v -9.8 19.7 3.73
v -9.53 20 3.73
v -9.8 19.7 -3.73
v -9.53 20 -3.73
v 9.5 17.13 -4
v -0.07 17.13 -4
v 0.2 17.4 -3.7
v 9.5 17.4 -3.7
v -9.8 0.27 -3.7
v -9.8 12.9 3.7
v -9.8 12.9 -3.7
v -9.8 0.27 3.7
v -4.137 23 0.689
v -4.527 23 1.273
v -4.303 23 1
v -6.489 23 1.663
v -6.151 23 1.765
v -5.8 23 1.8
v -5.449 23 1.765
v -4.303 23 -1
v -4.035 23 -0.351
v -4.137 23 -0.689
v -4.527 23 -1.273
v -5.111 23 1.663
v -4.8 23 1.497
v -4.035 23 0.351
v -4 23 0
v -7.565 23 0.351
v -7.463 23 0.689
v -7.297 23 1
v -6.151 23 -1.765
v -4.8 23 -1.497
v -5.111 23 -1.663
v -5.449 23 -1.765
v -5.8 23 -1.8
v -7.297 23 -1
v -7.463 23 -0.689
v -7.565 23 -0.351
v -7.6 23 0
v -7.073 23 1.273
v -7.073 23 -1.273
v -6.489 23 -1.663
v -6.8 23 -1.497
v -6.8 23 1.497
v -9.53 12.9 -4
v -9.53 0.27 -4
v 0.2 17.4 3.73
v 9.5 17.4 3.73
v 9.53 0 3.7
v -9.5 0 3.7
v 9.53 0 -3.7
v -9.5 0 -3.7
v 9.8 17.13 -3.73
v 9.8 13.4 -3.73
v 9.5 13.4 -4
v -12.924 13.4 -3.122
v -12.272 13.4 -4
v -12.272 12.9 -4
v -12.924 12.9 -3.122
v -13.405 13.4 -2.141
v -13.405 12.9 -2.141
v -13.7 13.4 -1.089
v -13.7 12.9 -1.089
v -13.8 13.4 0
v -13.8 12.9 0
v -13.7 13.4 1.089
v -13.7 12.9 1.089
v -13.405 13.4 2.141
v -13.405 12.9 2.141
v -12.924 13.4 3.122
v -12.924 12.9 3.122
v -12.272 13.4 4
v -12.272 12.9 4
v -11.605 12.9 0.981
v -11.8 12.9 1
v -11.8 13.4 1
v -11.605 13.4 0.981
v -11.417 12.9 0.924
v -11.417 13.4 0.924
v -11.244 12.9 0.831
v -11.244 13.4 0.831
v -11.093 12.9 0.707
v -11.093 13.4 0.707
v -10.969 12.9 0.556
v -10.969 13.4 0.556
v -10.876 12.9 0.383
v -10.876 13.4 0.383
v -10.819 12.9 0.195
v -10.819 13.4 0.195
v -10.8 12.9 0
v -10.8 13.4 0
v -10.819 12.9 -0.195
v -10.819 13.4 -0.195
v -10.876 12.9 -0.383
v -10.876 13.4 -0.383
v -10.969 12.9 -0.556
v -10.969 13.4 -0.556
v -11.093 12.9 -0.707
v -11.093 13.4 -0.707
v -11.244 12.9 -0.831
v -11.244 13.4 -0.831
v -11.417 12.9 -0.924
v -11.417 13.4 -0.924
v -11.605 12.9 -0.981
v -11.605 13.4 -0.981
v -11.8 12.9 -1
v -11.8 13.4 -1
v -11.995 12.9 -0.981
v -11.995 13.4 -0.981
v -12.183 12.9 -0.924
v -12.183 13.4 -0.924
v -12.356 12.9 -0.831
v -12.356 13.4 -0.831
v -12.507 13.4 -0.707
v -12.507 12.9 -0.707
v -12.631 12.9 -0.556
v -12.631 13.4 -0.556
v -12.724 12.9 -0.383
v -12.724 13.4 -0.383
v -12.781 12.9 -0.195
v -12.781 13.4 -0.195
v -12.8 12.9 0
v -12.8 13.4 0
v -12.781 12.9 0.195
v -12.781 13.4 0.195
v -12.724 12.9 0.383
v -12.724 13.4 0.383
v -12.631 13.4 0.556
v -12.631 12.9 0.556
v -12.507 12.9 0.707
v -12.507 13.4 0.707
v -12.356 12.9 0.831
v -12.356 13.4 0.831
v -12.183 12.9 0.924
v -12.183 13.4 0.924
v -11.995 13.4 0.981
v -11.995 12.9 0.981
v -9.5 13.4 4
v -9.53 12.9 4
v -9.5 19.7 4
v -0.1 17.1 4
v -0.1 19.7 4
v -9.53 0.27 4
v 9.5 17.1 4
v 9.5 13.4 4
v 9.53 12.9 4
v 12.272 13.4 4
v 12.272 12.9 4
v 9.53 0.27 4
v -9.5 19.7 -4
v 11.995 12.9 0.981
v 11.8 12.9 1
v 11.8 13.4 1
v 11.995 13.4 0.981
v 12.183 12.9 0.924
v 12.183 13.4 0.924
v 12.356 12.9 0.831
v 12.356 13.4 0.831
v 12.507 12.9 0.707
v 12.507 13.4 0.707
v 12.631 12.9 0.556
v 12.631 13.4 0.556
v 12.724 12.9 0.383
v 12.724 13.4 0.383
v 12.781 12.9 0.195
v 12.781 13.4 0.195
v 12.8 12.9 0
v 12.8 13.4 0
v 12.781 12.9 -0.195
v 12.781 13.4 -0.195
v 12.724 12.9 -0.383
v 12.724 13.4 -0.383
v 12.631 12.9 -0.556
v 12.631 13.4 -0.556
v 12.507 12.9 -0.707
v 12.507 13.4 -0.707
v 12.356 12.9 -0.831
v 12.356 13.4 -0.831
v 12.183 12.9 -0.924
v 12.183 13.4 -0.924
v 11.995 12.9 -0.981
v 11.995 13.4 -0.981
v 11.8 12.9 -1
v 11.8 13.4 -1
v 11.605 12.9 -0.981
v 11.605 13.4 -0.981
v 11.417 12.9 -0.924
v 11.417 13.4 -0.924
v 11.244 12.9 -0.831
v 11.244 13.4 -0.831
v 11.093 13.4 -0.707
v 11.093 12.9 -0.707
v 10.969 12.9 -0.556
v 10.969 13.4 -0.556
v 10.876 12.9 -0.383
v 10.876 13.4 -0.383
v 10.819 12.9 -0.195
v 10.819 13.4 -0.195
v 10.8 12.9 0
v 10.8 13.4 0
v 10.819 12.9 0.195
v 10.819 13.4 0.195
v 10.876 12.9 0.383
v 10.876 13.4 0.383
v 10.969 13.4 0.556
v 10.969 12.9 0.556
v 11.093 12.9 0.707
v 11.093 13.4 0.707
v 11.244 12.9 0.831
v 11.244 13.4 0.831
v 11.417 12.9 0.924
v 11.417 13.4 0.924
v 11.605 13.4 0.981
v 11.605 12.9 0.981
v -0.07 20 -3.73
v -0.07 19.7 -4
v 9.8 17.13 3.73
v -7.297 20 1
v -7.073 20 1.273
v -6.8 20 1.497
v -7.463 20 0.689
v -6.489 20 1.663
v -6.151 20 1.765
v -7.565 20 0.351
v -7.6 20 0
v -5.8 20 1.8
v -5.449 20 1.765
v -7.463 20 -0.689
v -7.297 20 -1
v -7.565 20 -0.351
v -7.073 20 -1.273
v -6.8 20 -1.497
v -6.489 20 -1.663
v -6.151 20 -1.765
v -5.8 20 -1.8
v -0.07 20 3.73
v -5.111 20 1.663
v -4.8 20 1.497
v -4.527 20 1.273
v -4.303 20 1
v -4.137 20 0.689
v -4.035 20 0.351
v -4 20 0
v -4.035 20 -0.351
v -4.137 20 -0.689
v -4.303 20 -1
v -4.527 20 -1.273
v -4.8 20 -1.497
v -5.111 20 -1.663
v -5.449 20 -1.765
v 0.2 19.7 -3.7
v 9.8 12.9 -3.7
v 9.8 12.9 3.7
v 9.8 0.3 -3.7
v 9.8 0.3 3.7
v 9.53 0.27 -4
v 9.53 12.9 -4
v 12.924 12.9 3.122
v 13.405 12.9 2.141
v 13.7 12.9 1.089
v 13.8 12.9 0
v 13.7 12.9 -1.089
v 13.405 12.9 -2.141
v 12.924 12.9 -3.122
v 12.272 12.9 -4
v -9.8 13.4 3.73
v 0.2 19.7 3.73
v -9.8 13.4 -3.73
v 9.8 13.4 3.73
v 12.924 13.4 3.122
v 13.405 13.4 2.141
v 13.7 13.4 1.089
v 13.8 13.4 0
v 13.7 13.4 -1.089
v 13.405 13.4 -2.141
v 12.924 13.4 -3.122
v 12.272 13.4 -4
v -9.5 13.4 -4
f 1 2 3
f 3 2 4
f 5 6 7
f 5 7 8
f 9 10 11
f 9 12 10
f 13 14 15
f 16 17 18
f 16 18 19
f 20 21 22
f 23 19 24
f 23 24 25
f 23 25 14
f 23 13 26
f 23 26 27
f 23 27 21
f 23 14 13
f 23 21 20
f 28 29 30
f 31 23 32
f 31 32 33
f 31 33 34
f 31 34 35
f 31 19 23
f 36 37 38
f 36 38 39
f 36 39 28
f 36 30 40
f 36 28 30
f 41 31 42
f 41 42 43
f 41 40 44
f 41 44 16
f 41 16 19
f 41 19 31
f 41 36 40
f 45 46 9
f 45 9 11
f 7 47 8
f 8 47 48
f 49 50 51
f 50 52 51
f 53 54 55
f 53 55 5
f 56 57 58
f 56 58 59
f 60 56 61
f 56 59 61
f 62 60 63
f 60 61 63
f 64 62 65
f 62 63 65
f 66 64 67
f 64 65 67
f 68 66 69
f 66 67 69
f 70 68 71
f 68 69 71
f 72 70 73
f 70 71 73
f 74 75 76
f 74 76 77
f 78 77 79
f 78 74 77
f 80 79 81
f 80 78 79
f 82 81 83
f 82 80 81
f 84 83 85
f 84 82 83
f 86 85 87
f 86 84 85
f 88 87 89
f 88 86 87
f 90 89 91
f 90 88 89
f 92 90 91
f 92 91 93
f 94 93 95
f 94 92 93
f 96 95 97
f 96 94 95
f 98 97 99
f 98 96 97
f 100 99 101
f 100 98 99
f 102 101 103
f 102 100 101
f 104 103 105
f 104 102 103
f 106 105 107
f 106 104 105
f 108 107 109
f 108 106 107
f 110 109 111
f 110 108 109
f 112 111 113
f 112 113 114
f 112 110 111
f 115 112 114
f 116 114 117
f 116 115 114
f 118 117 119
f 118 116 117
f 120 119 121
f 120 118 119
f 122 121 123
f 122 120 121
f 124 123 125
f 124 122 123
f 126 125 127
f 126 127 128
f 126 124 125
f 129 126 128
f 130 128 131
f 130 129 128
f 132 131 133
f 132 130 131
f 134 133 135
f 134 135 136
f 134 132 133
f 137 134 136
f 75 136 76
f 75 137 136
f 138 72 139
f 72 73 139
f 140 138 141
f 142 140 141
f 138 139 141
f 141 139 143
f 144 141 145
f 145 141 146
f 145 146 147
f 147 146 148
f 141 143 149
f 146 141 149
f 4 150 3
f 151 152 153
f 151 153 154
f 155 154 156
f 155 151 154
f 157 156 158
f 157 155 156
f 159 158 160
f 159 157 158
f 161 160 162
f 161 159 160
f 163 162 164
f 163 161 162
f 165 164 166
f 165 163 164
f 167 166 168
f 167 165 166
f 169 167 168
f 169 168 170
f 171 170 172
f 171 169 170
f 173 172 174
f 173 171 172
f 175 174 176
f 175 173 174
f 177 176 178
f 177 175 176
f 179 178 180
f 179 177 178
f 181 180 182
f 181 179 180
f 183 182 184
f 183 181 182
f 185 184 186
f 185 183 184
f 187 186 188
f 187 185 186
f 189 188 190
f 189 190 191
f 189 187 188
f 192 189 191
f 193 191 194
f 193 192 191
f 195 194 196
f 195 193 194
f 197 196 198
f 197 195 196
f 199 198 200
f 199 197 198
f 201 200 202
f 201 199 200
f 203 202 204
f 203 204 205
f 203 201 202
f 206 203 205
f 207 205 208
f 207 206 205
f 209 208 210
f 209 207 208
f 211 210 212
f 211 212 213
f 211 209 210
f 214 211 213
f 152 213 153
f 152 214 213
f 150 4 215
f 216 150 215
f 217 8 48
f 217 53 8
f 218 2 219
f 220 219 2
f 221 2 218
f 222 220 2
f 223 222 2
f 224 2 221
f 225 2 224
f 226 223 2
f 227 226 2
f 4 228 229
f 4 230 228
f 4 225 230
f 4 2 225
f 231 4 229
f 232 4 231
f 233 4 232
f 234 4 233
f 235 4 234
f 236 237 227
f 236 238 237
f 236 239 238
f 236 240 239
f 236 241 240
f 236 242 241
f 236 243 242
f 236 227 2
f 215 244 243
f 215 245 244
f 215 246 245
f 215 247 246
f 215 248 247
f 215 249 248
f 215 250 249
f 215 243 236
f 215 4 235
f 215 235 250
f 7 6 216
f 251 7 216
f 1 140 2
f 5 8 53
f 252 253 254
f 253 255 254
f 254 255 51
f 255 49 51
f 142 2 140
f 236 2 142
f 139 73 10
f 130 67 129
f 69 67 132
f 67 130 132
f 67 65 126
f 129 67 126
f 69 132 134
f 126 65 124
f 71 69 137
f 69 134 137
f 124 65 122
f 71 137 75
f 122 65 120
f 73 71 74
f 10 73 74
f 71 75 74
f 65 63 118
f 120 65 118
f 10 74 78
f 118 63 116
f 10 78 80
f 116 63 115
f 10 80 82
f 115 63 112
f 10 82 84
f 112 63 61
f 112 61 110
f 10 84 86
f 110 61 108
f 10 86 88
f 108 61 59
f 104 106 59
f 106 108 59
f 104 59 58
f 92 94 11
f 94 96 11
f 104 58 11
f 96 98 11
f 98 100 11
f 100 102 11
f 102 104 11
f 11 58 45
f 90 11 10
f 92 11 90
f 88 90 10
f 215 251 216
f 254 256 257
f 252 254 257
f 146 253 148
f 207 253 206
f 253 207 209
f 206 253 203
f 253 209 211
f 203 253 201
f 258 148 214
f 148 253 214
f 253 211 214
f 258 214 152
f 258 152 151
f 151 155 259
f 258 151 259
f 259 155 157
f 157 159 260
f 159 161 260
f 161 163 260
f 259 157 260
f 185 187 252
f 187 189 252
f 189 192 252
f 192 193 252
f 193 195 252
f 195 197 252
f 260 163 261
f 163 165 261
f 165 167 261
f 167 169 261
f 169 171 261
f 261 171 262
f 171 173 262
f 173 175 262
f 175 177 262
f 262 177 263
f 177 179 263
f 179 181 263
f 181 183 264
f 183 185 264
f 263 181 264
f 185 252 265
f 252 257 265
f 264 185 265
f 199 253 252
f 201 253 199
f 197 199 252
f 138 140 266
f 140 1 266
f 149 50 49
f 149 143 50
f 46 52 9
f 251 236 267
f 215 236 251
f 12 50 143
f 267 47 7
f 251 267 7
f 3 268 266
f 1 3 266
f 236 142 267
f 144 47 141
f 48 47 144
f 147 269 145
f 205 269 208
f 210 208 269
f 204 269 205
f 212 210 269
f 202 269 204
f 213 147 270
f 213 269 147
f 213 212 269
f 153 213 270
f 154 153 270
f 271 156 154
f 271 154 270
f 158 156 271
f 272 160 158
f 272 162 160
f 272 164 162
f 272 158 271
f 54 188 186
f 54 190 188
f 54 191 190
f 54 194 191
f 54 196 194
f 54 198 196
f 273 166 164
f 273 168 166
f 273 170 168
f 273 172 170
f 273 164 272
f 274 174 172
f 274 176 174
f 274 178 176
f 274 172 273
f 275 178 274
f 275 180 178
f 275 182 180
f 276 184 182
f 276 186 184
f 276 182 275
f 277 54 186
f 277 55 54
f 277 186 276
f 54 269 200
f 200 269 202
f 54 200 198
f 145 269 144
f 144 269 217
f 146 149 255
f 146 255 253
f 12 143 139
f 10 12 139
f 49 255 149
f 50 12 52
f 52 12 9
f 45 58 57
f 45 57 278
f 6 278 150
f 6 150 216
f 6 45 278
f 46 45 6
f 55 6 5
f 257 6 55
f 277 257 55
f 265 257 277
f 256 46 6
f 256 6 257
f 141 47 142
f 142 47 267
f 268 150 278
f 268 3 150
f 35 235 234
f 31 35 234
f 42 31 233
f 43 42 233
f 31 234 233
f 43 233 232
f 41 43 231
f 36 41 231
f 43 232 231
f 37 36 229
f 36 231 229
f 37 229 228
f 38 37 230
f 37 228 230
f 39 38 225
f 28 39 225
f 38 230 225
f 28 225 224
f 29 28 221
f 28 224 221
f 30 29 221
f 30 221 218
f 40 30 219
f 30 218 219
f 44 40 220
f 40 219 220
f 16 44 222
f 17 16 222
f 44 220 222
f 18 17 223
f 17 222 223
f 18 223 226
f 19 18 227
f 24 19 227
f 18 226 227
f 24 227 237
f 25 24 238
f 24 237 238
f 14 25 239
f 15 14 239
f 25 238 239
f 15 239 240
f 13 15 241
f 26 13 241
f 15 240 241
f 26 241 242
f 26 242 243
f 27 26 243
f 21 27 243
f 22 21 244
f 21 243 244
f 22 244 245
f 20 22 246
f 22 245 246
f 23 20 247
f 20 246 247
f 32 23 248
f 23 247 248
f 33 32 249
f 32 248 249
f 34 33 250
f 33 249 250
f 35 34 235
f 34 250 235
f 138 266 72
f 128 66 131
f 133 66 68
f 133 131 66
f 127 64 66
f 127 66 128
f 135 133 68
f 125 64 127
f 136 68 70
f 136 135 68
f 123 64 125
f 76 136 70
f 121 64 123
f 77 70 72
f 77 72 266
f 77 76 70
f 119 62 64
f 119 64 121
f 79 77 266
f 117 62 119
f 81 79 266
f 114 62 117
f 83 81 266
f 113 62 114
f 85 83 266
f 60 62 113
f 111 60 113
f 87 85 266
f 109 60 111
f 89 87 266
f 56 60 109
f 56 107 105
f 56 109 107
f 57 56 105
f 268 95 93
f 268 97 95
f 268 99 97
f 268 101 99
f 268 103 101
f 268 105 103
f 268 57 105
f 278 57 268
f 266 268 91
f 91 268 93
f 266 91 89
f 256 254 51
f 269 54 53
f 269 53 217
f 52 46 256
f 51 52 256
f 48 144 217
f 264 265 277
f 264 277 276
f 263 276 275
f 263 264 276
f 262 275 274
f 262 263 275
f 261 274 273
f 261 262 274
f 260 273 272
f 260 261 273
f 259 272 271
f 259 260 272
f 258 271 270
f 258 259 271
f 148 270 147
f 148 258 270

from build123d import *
from OCP.BRepFilletAPI import BRepFilletAPI_MakeChamfer

# Parameters (mm, degrees)
SKETCH_1_W          = 19.6
SKETCH_1_H          = 8
EXTRUDE_1_DEPTH     = 12.9
SKETCH_2_W          = 27.6
SKETCH_2_H          = 8
SKETCH_2_R          = 1
EXTRUDE_2_DEPTH     = 0.5
SKETCH_3_W          = 19.6
SKETCH_3_H          = 8
EXTRUDE_3_DEPTH     = 17.4
SKETCH_4_W          = 10
SKETCH_4_H          = 8
EXTRUDE_5_DEPTH     = 20
SKETCH_6_R          = 1.8
EXTRUDE_6_DEPTH     = 3
CUT_EXTRUDE_2_DEPTH = 17
CHAMFER_1_SIZE      = 0.3
CHAMFER_1_SIZE2     = 0.270121213


with BuildPart() as part:
    # 草图1 → 凸台-拉伸1 (new body)
    with BuildSketch(Plane(origin=(0, 0, 0), x_dir=(1, 0, 0), z_dir=(0, 1, 0))):
        Rectangle(SKETCH_1_W, SKETCH_1_H)
    extrude(amount=EXTRUDE_1_DEPTH)

    # 草图2 → 凸台-拉伸2 (add)
    with BuildSketch(Plane(origin=(0, 12.9, 0), x_dir=(1, 0, 0), z_dir=(0, 1, 0))):
        Rectangle(SKETCH_2_W, SKETCH_2_H)
        with Locations(Location((-11.8, 0, 0), (0, 0, 270))):
            Circle(SKETCH_2_R, mode=Mode.SUBTRACT)
        with Locations(Location((11.8, 0, 0), (0, 0, 270))):
            Circle(SKETCH_2_R, mode=Mode.SUBTRACT)
    extrude(amount=EXTRUDE_2_DEPTH)

    # 草图3 → 凸台-拉伸3 (add)
    with BuildSketch(Plane.XZ):
        Rectangle(SKETCH_3_W, SKETCH_3_H)
    extrude(amount=-EXTRUDE_3_DEPTH)

    # 草图4 → 凸台-拉伸5 (add)
    with BuildSketch(Plane(origin=(0, 0, 0), x_dir=(1, 0, 0), z_dir=(0, 1, 0))):
        with Locations((-4.8, 0)):
            Rectangle(SKETCH_4_W, SKETCH_4_H)
    extrude(amount=EXTRUDE_5_DEPTH)

    # 草图6 → 凸台-拉伸6 (add)
    with BuildSketch(Plane(origin=(0, 20, 0), x_dir=(1, 0, 0), z_dir=(0, 1, 0))):
        with Locations(Location((-5.8, 0, 0), (0, 0, 90))):
            Circle(SKETCH_6_R)
    extrude(amount=EXTRUDE_6_DEPTH)

    # 草图7 → 切除-拉伸2 (cut)
    with BuildSketch(Plane.XZ):
        with BuildLine():
            Line((14.367004184, -5.785535706), (9.389835398, -5.785535706))
            ThreePointArc((9.389835398, -5.785535706), (13.783545245, -0.444056645), (10.226439047, 5.487476064))
            Line((10.226439047, 5.487476064), (14.54010062, 5.487476064))
            Line((14.54010062, 5.487476064), (14.367004184, -5.785535706))
        make_face()
        with BuildLine():
            Line((-10.226439047, 5.487476064), (-14.54010062, 5.487476064))
            Line((-14.54010062, 5.487476064), (-14.367004184, -5.785535706))
            Line((-14.367004184, -5.785535706), (-9.389835398, -5.785535706))
            ThreePointArc((-9.389835398, -5.785535706), (-13.783545245, -0.444056645), (-10.226439047, 5.487476064))
        make_face()
    extrude(amount=-CUT_EXTRUDE_2_DEPTH, mode=Mode.SUBTRACT)

    # 倒角1: one chamfer whose edges measure the first distance from different faces: ONE call of the kernel's chamfer builder (chamfer() names one face for all edges)
    chamfer_1_edges_1 = [part.edges().sort_by_distance(p)[0] for p in [
        (9.8, 15.4, -4),
        (-9.8, 16.7, -4),
        (-4.8, 20, -4),
    ]]
    chamfer_1_side_1 = [part.faces().sort_by_distance(p)[0] for p in [
        (-0.337742628, 9.433402177, -4),
    ]]
    chamfer_1_edges_2 = [part.edges().sort_by_distance(p)[0] for p in [
        (-9.8, 16.7, 4),
        (5, 17.4, 4),
        (9.8, 15.4, 4),
        (0.2, 18.7, 4),
        (-4.8, 20, 4),
    ]]
    chamfer_1_side_2 = [part.faces().sort_by_distance(p)[0] for p in [
        (-0.337742628, 9.433402177, 4),
    ]]
    chamfer_1_edges_3 = [part.edges().sort_by_distance(p)[0] for p in [
        (9.8, 17.4, 0),
        (5, 17.4, -4),
    ]]
    chamfer_1_side_3 = [part.faces().sort_by_distance(p)[0] for p in [
        (5, 17.4, 0),
    ]]
    chamfer_1_edges_4 = [part.edges().sort_by_distance(p)[0] for p in [
        (0, 0, 4),
        (-9.8, 0, 0),
        (0, 0, -4),
    ]]
    chamfer_1_side_4 = [part.faces().sort_by_distance(p)[0] for p in [
        (0, 0, 0),
    ]]
    chamfer_1_edges_5 = [part.edges().sort_by_distance(p)[0] for p in [
        (0.2, 18.7, -4),
        (0.2, 20, 0),
    ]]
    chamfer_1_side_5 = [part.faces().sort_by_distance(p)[0] for p in [
        (0.2, 18.7, 0),
    ]]
    chamfer_1_edges_6 = [part.edges().sort_by_distance(p)[0] for p in [
        (9.8, 0, 0),
        (9.8, 6.45, 4),
        (9.8, 6.45, -4),
    ]]
    chamfer_1_side_6 = [part.faces().sort_by_distance(p)[0] for p in [
        (9.8, 6.45, 0),
    ]]
    chamfer_1_edges_7 = [part.edges().sort_by_distance(p)[0] for p in [
        (-9.8, 20, 0),
    ]]
    chamfer_1_side_7 = [part.faces().sort_by_distance(p)[0] for p in [
        (-9.8, 16.7, 0),
    ]]
    chamfer_1_edges_8 = [part.edges().sort_by_distance(p)[0] for p in [
        (-9.8, 6.45, 4),
        (-9.8, 6.45, -4),
    ]]
    chamfer_1_side_8 = [part.faces().sort_by_distance(p)[0] for p in [
        (-9.8, 6.45, 0),
    ]]
    chamfer_1 = BRepFilletAPI_MakeChamfer(part.part.solid().wrapped)
    for e in chamfer_1_edges_1:
        chamfer_1.Add(CHAMFER_1_SIZE, CHAMFER_1_SIZE2, e.wrapped, chamfer_1_side_1[0].wrapped)  # the first distance lies on this face
    for e in chamfer_1_edges_2:
        chamfer_1.Add(CHAMFER_1_SIZE, CHAMFER_1_SIZE2, e.wrapped, chamfer_1_side_2[0].wrapped)  # the first distance lies on this face
    for e in chamfer_1_edges_3:
        chamfer_1.Add(CHAMFER_1_SIZE, CHAMFER_1_SIZE2, e.wrapped, chamfer_1_side_3[0].wrapped)  # the first distance lies on this face
    for e in chamfer_1_edges_4:
        chamfer_1.Add(CHAMFER_1_SIZE, CHAMFER_1_SIZE2, e.wrapped, chamfer_1_side_4[0].wrapped)  # the first distance lies on this face
    for e in chamfer_1_edges_5:
        chamfer_1.Add(CHAMFER_1_SIZE, CHAMFER_1_SIZE2, e.wrapped, chamfer_1_side_5[0].wrapped)  # the first distance lies on this face
    for e in chamfer_1_edges_6:
        chamfer_1.Add(CHAMFER_1_SIZE, CHAMFER_1_SIZE2, e.wrapped, chamfer_1_side_6[0].wrapped)  # the first distance lies on this face
    for e in chamfer_1_edges_7:
        chamfer_1.Add(CHAMFER_1_SIZE, CHAMFER_1_SIZE2, e.wrapped, chamfer_1_side_7[0].wrapped)  # the first distance lies on this face
    for e in chamfer_1_edges_8:
        chamfer_1.Add(CHAMFER_1_SIZE, CHAMFER_1_SIZE2, e.wrapped, chamfer_1_side_8[0].wrapped)  # the first distance lies on this face
    add(Compound.cast(chamfer_1.Shape()), mode=Mode.REPLACE)


solid = part.part
